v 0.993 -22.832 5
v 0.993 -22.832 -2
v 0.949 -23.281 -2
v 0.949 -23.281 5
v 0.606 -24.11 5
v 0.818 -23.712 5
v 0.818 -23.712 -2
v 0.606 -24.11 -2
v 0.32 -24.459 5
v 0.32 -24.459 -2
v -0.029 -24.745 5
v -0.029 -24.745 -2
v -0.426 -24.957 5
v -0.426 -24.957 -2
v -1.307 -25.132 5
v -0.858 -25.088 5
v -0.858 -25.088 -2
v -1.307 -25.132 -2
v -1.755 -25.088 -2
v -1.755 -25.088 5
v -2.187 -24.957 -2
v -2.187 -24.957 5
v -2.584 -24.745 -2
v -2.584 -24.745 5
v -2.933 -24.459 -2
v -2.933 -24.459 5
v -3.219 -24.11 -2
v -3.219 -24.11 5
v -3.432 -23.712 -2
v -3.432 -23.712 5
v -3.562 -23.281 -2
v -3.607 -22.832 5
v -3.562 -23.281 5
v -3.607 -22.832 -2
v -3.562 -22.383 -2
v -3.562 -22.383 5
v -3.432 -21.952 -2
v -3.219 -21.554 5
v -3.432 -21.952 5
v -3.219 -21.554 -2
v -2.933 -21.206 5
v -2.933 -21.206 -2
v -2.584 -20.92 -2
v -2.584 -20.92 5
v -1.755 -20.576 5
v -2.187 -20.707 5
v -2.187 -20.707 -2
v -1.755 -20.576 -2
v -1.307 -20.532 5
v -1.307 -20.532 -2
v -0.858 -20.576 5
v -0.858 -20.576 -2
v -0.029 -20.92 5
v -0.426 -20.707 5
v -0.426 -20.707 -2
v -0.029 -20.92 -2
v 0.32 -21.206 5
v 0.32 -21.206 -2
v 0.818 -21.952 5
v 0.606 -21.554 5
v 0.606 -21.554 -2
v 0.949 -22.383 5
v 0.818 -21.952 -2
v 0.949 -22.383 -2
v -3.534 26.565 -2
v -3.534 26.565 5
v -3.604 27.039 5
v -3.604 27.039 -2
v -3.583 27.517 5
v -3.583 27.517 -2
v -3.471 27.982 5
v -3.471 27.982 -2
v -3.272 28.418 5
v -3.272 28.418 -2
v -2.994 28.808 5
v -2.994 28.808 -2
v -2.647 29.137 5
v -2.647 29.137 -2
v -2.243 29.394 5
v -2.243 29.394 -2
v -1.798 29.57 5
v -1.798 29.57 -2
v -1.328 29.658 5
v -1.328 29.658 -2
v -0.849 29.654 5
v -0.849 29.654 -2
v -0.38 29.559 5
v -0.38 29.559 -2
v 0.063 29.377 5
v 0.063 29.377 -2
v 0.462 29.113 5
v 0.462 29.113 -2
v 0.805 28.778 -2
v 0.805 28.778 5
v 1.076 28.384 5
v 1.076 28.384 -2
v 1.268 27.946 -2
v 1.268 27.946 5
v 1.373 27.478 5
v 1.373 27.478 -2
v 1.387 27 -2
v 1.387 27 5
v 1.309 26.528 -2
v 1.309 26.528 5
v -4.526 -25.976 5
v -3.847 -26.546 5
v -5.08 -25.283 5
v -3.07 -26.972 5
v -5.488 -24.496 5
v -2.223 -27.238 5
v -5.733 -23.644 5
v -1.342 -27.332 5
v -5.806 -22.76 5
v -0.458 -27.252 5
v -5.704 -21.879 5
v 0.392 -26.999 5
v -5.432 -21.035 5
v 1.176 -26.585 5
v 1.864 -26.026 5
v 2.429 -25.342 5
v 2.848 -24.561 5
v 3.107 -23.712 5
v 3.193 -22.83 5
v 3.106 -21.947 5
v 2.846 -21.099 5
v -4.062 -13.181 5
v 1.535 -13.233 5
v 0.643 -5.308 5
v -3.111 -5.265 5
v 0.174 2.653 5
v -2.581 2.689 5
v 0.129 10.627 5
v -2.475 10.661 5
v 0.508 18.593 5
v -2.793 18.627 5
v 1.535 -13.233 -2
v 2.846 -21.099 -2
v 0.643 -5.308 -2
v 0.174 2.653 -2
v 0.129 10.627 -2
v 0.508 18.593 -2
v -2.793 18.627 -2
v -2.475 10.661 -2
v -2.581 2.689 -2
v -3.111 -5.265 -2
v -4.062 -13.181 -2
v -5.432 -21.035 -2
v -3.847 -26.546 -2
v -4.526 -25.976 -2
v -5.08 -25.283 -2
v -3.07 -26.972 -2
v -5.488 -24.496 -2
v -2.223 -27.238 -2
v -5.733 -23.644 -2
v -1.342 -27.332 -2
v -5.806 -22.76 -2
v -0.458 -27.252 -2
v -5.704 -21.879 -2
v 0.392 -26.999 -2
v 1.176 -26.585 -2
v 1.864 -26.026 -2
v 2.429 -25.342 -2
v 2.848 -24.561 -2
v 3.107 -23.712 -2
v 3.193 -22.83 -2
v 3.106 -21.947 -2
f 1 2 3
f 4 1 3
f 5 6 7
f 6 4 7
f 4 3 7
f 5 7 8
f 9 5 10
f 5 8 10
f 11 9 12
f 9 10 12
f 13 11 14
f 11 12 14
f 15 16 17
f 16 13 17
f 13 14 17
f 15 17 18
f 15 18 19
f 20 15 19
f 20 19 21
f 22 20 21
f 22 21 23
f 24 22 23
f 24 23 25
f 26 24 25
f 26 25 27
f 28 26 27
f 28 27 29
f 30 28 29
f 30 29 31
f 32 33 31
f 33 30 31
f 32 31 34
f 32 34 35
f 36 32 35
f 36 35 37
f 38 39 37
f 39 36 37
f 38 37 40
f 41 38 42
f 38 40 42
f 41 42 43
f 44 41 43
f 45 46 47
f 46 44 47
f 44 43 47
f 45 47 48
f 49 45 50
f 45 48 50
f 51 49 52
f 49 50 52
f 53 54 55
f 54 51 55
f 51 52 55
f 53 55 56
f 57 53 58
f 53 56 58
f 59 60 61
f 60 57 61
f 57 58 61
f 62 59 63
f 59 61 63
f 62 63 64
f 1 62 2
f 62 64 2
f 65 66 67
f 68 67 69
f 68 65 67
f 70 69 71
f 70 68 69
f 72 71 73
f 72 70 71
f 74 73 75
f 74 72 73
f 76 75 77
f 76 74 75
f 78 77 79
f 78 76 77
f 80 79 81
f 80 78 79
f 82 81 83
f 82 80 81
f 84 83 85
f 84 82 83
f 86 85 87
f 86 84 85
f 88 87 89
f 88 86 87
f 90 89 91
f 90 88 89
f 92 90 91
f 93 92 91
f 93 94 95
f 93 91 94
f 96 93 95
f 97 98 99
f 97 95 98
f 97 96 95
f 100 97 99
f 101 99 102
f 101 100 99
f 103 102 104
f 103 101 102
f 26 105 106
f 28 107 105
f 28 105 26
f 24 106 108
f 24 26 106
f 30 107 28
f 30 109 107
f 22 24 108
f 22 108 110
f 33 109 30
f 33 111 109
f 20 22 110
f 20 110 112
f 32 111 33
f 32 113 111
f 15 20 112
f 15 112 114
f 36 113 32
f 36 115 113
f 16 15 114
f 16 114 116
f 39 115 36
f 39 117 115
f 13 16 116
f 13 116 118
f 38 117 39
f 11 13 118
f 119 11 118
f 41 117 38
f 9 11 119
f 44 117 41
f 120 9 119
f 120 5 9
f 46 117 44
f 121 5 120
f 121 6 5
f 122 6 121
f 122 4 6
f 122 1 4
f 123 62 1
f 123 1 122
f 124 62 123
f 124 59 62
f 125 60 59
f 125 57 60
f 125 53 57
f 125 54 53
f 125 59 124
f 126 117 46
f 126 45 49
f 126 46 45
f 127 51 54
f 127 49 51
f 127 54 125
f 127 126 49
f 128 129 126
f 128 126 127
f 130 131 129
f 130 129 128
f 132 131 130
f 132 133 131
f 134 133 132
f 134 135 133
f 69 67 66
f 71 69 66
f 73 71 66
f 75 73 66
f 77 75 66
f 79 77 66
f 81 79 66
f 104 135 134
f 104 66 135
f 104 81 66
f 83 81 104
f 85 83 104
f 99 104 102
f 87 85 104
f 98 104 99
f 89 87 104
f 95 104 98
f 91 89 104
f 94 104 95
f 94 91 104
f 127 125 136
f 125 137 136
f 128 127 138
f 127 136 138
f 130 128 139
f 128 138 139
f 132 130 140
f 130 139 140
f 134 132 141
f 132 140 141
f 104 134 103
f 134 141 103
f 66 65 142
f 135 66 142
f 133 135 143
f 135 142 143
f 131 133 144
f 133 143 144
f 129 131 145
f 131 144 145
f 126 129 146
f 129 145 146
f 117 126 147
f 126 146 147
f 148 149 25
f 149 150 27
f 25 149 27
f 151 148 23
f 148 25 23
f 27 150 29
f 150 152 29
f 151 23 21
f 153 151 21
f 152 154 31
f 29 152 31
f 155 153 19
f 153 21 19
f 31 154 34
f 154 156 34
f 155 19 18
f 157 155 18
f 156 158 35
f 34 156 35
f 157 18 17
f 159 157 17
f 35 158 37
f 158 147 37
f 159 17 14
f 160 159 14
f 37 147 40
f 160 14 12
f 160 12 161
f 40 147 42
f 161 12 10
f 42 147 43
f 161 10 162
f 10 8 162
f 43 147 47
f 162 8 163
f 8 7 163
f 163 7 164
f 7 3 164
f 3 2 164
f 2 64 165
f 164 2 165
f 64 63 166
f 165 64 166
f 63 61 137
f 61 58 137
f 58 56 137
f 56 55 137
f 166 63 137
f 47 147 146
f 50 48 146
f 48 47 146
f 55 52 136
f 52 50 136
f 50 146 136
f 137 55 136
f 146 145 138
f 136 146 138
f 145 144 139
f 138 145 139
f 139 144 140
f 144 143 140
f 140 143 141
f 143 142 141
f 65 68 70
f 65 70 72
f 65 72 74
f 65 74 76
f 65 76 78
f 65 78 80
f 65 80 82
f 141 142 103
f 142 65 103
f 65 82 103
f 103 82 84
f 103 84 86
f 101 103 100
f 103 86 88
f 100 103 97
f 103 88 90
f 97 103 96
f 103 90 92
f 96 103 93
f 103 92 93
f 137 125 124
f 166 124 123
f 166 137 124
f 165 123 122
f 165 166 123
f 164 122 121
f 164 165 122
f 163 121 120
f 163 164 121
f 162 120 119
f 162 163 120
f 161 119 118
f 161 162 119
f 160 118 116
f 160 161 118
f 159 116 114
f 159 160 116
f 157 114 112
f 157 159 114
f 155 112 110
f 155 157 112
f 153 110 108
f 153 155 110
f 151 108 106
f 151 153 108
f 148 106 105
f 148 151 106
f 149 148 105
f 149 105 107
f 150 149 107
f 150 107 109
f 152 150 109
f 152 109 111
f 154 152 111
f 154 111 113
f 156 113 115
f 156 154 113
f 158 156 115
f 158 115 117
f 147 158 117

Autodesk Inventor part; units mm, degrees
ref_plane "YZ Plane" through (0, 0, 0) normal (1, 0, 0) x (0, 1, 0)
ref_plane "XZ Plane" through (0, 0, 0) normal (0, 1, 0) x (-1, 0, 0)
ref_plane "XY Plane" through (0, 0, 0) normal (0, 0, 1) x (1, 0, 0)
sketch "Sketch1" plane through (0, 0, 0) normal (0, 0, 1) x (1, 0, 0)
  circle A0 centre (-1.3066, -22.8322) radius 2.3
  circle A1 centre (-1.3066, -22.8322) radius 4.5
  circle A2 centre (-1.1075, 27.1674) radius 2.5
  arc A3 (-5.8066, -22.8322) -> (-3.6075, 27.1674) centre (-152.4621, 8.6663) ccw
  arc A4 (1.3925, 27.1674) -> (3.1934, -22.8322) centre (150.0964, 7.4911) ccw
  point P0 (0, 0)
  point P1 (2.8463, -21.0992)
  point P2 (1.3093, 26.5276)
  point P3 (-3.5339, 26.5652)
  point P4 (-5.432, -21.0348)
  dimension "d0" = 4.6
  dimension "d1" = 9
  dimension "d2" = 5
  dimension "d3" = 50
  dimension "d17" = 150
  dimension "d18" = 150
extrude "Extrusion1" add sketch "Sketch1" along normal blind 5 and the other way blind 2
properties part number "gate2"
